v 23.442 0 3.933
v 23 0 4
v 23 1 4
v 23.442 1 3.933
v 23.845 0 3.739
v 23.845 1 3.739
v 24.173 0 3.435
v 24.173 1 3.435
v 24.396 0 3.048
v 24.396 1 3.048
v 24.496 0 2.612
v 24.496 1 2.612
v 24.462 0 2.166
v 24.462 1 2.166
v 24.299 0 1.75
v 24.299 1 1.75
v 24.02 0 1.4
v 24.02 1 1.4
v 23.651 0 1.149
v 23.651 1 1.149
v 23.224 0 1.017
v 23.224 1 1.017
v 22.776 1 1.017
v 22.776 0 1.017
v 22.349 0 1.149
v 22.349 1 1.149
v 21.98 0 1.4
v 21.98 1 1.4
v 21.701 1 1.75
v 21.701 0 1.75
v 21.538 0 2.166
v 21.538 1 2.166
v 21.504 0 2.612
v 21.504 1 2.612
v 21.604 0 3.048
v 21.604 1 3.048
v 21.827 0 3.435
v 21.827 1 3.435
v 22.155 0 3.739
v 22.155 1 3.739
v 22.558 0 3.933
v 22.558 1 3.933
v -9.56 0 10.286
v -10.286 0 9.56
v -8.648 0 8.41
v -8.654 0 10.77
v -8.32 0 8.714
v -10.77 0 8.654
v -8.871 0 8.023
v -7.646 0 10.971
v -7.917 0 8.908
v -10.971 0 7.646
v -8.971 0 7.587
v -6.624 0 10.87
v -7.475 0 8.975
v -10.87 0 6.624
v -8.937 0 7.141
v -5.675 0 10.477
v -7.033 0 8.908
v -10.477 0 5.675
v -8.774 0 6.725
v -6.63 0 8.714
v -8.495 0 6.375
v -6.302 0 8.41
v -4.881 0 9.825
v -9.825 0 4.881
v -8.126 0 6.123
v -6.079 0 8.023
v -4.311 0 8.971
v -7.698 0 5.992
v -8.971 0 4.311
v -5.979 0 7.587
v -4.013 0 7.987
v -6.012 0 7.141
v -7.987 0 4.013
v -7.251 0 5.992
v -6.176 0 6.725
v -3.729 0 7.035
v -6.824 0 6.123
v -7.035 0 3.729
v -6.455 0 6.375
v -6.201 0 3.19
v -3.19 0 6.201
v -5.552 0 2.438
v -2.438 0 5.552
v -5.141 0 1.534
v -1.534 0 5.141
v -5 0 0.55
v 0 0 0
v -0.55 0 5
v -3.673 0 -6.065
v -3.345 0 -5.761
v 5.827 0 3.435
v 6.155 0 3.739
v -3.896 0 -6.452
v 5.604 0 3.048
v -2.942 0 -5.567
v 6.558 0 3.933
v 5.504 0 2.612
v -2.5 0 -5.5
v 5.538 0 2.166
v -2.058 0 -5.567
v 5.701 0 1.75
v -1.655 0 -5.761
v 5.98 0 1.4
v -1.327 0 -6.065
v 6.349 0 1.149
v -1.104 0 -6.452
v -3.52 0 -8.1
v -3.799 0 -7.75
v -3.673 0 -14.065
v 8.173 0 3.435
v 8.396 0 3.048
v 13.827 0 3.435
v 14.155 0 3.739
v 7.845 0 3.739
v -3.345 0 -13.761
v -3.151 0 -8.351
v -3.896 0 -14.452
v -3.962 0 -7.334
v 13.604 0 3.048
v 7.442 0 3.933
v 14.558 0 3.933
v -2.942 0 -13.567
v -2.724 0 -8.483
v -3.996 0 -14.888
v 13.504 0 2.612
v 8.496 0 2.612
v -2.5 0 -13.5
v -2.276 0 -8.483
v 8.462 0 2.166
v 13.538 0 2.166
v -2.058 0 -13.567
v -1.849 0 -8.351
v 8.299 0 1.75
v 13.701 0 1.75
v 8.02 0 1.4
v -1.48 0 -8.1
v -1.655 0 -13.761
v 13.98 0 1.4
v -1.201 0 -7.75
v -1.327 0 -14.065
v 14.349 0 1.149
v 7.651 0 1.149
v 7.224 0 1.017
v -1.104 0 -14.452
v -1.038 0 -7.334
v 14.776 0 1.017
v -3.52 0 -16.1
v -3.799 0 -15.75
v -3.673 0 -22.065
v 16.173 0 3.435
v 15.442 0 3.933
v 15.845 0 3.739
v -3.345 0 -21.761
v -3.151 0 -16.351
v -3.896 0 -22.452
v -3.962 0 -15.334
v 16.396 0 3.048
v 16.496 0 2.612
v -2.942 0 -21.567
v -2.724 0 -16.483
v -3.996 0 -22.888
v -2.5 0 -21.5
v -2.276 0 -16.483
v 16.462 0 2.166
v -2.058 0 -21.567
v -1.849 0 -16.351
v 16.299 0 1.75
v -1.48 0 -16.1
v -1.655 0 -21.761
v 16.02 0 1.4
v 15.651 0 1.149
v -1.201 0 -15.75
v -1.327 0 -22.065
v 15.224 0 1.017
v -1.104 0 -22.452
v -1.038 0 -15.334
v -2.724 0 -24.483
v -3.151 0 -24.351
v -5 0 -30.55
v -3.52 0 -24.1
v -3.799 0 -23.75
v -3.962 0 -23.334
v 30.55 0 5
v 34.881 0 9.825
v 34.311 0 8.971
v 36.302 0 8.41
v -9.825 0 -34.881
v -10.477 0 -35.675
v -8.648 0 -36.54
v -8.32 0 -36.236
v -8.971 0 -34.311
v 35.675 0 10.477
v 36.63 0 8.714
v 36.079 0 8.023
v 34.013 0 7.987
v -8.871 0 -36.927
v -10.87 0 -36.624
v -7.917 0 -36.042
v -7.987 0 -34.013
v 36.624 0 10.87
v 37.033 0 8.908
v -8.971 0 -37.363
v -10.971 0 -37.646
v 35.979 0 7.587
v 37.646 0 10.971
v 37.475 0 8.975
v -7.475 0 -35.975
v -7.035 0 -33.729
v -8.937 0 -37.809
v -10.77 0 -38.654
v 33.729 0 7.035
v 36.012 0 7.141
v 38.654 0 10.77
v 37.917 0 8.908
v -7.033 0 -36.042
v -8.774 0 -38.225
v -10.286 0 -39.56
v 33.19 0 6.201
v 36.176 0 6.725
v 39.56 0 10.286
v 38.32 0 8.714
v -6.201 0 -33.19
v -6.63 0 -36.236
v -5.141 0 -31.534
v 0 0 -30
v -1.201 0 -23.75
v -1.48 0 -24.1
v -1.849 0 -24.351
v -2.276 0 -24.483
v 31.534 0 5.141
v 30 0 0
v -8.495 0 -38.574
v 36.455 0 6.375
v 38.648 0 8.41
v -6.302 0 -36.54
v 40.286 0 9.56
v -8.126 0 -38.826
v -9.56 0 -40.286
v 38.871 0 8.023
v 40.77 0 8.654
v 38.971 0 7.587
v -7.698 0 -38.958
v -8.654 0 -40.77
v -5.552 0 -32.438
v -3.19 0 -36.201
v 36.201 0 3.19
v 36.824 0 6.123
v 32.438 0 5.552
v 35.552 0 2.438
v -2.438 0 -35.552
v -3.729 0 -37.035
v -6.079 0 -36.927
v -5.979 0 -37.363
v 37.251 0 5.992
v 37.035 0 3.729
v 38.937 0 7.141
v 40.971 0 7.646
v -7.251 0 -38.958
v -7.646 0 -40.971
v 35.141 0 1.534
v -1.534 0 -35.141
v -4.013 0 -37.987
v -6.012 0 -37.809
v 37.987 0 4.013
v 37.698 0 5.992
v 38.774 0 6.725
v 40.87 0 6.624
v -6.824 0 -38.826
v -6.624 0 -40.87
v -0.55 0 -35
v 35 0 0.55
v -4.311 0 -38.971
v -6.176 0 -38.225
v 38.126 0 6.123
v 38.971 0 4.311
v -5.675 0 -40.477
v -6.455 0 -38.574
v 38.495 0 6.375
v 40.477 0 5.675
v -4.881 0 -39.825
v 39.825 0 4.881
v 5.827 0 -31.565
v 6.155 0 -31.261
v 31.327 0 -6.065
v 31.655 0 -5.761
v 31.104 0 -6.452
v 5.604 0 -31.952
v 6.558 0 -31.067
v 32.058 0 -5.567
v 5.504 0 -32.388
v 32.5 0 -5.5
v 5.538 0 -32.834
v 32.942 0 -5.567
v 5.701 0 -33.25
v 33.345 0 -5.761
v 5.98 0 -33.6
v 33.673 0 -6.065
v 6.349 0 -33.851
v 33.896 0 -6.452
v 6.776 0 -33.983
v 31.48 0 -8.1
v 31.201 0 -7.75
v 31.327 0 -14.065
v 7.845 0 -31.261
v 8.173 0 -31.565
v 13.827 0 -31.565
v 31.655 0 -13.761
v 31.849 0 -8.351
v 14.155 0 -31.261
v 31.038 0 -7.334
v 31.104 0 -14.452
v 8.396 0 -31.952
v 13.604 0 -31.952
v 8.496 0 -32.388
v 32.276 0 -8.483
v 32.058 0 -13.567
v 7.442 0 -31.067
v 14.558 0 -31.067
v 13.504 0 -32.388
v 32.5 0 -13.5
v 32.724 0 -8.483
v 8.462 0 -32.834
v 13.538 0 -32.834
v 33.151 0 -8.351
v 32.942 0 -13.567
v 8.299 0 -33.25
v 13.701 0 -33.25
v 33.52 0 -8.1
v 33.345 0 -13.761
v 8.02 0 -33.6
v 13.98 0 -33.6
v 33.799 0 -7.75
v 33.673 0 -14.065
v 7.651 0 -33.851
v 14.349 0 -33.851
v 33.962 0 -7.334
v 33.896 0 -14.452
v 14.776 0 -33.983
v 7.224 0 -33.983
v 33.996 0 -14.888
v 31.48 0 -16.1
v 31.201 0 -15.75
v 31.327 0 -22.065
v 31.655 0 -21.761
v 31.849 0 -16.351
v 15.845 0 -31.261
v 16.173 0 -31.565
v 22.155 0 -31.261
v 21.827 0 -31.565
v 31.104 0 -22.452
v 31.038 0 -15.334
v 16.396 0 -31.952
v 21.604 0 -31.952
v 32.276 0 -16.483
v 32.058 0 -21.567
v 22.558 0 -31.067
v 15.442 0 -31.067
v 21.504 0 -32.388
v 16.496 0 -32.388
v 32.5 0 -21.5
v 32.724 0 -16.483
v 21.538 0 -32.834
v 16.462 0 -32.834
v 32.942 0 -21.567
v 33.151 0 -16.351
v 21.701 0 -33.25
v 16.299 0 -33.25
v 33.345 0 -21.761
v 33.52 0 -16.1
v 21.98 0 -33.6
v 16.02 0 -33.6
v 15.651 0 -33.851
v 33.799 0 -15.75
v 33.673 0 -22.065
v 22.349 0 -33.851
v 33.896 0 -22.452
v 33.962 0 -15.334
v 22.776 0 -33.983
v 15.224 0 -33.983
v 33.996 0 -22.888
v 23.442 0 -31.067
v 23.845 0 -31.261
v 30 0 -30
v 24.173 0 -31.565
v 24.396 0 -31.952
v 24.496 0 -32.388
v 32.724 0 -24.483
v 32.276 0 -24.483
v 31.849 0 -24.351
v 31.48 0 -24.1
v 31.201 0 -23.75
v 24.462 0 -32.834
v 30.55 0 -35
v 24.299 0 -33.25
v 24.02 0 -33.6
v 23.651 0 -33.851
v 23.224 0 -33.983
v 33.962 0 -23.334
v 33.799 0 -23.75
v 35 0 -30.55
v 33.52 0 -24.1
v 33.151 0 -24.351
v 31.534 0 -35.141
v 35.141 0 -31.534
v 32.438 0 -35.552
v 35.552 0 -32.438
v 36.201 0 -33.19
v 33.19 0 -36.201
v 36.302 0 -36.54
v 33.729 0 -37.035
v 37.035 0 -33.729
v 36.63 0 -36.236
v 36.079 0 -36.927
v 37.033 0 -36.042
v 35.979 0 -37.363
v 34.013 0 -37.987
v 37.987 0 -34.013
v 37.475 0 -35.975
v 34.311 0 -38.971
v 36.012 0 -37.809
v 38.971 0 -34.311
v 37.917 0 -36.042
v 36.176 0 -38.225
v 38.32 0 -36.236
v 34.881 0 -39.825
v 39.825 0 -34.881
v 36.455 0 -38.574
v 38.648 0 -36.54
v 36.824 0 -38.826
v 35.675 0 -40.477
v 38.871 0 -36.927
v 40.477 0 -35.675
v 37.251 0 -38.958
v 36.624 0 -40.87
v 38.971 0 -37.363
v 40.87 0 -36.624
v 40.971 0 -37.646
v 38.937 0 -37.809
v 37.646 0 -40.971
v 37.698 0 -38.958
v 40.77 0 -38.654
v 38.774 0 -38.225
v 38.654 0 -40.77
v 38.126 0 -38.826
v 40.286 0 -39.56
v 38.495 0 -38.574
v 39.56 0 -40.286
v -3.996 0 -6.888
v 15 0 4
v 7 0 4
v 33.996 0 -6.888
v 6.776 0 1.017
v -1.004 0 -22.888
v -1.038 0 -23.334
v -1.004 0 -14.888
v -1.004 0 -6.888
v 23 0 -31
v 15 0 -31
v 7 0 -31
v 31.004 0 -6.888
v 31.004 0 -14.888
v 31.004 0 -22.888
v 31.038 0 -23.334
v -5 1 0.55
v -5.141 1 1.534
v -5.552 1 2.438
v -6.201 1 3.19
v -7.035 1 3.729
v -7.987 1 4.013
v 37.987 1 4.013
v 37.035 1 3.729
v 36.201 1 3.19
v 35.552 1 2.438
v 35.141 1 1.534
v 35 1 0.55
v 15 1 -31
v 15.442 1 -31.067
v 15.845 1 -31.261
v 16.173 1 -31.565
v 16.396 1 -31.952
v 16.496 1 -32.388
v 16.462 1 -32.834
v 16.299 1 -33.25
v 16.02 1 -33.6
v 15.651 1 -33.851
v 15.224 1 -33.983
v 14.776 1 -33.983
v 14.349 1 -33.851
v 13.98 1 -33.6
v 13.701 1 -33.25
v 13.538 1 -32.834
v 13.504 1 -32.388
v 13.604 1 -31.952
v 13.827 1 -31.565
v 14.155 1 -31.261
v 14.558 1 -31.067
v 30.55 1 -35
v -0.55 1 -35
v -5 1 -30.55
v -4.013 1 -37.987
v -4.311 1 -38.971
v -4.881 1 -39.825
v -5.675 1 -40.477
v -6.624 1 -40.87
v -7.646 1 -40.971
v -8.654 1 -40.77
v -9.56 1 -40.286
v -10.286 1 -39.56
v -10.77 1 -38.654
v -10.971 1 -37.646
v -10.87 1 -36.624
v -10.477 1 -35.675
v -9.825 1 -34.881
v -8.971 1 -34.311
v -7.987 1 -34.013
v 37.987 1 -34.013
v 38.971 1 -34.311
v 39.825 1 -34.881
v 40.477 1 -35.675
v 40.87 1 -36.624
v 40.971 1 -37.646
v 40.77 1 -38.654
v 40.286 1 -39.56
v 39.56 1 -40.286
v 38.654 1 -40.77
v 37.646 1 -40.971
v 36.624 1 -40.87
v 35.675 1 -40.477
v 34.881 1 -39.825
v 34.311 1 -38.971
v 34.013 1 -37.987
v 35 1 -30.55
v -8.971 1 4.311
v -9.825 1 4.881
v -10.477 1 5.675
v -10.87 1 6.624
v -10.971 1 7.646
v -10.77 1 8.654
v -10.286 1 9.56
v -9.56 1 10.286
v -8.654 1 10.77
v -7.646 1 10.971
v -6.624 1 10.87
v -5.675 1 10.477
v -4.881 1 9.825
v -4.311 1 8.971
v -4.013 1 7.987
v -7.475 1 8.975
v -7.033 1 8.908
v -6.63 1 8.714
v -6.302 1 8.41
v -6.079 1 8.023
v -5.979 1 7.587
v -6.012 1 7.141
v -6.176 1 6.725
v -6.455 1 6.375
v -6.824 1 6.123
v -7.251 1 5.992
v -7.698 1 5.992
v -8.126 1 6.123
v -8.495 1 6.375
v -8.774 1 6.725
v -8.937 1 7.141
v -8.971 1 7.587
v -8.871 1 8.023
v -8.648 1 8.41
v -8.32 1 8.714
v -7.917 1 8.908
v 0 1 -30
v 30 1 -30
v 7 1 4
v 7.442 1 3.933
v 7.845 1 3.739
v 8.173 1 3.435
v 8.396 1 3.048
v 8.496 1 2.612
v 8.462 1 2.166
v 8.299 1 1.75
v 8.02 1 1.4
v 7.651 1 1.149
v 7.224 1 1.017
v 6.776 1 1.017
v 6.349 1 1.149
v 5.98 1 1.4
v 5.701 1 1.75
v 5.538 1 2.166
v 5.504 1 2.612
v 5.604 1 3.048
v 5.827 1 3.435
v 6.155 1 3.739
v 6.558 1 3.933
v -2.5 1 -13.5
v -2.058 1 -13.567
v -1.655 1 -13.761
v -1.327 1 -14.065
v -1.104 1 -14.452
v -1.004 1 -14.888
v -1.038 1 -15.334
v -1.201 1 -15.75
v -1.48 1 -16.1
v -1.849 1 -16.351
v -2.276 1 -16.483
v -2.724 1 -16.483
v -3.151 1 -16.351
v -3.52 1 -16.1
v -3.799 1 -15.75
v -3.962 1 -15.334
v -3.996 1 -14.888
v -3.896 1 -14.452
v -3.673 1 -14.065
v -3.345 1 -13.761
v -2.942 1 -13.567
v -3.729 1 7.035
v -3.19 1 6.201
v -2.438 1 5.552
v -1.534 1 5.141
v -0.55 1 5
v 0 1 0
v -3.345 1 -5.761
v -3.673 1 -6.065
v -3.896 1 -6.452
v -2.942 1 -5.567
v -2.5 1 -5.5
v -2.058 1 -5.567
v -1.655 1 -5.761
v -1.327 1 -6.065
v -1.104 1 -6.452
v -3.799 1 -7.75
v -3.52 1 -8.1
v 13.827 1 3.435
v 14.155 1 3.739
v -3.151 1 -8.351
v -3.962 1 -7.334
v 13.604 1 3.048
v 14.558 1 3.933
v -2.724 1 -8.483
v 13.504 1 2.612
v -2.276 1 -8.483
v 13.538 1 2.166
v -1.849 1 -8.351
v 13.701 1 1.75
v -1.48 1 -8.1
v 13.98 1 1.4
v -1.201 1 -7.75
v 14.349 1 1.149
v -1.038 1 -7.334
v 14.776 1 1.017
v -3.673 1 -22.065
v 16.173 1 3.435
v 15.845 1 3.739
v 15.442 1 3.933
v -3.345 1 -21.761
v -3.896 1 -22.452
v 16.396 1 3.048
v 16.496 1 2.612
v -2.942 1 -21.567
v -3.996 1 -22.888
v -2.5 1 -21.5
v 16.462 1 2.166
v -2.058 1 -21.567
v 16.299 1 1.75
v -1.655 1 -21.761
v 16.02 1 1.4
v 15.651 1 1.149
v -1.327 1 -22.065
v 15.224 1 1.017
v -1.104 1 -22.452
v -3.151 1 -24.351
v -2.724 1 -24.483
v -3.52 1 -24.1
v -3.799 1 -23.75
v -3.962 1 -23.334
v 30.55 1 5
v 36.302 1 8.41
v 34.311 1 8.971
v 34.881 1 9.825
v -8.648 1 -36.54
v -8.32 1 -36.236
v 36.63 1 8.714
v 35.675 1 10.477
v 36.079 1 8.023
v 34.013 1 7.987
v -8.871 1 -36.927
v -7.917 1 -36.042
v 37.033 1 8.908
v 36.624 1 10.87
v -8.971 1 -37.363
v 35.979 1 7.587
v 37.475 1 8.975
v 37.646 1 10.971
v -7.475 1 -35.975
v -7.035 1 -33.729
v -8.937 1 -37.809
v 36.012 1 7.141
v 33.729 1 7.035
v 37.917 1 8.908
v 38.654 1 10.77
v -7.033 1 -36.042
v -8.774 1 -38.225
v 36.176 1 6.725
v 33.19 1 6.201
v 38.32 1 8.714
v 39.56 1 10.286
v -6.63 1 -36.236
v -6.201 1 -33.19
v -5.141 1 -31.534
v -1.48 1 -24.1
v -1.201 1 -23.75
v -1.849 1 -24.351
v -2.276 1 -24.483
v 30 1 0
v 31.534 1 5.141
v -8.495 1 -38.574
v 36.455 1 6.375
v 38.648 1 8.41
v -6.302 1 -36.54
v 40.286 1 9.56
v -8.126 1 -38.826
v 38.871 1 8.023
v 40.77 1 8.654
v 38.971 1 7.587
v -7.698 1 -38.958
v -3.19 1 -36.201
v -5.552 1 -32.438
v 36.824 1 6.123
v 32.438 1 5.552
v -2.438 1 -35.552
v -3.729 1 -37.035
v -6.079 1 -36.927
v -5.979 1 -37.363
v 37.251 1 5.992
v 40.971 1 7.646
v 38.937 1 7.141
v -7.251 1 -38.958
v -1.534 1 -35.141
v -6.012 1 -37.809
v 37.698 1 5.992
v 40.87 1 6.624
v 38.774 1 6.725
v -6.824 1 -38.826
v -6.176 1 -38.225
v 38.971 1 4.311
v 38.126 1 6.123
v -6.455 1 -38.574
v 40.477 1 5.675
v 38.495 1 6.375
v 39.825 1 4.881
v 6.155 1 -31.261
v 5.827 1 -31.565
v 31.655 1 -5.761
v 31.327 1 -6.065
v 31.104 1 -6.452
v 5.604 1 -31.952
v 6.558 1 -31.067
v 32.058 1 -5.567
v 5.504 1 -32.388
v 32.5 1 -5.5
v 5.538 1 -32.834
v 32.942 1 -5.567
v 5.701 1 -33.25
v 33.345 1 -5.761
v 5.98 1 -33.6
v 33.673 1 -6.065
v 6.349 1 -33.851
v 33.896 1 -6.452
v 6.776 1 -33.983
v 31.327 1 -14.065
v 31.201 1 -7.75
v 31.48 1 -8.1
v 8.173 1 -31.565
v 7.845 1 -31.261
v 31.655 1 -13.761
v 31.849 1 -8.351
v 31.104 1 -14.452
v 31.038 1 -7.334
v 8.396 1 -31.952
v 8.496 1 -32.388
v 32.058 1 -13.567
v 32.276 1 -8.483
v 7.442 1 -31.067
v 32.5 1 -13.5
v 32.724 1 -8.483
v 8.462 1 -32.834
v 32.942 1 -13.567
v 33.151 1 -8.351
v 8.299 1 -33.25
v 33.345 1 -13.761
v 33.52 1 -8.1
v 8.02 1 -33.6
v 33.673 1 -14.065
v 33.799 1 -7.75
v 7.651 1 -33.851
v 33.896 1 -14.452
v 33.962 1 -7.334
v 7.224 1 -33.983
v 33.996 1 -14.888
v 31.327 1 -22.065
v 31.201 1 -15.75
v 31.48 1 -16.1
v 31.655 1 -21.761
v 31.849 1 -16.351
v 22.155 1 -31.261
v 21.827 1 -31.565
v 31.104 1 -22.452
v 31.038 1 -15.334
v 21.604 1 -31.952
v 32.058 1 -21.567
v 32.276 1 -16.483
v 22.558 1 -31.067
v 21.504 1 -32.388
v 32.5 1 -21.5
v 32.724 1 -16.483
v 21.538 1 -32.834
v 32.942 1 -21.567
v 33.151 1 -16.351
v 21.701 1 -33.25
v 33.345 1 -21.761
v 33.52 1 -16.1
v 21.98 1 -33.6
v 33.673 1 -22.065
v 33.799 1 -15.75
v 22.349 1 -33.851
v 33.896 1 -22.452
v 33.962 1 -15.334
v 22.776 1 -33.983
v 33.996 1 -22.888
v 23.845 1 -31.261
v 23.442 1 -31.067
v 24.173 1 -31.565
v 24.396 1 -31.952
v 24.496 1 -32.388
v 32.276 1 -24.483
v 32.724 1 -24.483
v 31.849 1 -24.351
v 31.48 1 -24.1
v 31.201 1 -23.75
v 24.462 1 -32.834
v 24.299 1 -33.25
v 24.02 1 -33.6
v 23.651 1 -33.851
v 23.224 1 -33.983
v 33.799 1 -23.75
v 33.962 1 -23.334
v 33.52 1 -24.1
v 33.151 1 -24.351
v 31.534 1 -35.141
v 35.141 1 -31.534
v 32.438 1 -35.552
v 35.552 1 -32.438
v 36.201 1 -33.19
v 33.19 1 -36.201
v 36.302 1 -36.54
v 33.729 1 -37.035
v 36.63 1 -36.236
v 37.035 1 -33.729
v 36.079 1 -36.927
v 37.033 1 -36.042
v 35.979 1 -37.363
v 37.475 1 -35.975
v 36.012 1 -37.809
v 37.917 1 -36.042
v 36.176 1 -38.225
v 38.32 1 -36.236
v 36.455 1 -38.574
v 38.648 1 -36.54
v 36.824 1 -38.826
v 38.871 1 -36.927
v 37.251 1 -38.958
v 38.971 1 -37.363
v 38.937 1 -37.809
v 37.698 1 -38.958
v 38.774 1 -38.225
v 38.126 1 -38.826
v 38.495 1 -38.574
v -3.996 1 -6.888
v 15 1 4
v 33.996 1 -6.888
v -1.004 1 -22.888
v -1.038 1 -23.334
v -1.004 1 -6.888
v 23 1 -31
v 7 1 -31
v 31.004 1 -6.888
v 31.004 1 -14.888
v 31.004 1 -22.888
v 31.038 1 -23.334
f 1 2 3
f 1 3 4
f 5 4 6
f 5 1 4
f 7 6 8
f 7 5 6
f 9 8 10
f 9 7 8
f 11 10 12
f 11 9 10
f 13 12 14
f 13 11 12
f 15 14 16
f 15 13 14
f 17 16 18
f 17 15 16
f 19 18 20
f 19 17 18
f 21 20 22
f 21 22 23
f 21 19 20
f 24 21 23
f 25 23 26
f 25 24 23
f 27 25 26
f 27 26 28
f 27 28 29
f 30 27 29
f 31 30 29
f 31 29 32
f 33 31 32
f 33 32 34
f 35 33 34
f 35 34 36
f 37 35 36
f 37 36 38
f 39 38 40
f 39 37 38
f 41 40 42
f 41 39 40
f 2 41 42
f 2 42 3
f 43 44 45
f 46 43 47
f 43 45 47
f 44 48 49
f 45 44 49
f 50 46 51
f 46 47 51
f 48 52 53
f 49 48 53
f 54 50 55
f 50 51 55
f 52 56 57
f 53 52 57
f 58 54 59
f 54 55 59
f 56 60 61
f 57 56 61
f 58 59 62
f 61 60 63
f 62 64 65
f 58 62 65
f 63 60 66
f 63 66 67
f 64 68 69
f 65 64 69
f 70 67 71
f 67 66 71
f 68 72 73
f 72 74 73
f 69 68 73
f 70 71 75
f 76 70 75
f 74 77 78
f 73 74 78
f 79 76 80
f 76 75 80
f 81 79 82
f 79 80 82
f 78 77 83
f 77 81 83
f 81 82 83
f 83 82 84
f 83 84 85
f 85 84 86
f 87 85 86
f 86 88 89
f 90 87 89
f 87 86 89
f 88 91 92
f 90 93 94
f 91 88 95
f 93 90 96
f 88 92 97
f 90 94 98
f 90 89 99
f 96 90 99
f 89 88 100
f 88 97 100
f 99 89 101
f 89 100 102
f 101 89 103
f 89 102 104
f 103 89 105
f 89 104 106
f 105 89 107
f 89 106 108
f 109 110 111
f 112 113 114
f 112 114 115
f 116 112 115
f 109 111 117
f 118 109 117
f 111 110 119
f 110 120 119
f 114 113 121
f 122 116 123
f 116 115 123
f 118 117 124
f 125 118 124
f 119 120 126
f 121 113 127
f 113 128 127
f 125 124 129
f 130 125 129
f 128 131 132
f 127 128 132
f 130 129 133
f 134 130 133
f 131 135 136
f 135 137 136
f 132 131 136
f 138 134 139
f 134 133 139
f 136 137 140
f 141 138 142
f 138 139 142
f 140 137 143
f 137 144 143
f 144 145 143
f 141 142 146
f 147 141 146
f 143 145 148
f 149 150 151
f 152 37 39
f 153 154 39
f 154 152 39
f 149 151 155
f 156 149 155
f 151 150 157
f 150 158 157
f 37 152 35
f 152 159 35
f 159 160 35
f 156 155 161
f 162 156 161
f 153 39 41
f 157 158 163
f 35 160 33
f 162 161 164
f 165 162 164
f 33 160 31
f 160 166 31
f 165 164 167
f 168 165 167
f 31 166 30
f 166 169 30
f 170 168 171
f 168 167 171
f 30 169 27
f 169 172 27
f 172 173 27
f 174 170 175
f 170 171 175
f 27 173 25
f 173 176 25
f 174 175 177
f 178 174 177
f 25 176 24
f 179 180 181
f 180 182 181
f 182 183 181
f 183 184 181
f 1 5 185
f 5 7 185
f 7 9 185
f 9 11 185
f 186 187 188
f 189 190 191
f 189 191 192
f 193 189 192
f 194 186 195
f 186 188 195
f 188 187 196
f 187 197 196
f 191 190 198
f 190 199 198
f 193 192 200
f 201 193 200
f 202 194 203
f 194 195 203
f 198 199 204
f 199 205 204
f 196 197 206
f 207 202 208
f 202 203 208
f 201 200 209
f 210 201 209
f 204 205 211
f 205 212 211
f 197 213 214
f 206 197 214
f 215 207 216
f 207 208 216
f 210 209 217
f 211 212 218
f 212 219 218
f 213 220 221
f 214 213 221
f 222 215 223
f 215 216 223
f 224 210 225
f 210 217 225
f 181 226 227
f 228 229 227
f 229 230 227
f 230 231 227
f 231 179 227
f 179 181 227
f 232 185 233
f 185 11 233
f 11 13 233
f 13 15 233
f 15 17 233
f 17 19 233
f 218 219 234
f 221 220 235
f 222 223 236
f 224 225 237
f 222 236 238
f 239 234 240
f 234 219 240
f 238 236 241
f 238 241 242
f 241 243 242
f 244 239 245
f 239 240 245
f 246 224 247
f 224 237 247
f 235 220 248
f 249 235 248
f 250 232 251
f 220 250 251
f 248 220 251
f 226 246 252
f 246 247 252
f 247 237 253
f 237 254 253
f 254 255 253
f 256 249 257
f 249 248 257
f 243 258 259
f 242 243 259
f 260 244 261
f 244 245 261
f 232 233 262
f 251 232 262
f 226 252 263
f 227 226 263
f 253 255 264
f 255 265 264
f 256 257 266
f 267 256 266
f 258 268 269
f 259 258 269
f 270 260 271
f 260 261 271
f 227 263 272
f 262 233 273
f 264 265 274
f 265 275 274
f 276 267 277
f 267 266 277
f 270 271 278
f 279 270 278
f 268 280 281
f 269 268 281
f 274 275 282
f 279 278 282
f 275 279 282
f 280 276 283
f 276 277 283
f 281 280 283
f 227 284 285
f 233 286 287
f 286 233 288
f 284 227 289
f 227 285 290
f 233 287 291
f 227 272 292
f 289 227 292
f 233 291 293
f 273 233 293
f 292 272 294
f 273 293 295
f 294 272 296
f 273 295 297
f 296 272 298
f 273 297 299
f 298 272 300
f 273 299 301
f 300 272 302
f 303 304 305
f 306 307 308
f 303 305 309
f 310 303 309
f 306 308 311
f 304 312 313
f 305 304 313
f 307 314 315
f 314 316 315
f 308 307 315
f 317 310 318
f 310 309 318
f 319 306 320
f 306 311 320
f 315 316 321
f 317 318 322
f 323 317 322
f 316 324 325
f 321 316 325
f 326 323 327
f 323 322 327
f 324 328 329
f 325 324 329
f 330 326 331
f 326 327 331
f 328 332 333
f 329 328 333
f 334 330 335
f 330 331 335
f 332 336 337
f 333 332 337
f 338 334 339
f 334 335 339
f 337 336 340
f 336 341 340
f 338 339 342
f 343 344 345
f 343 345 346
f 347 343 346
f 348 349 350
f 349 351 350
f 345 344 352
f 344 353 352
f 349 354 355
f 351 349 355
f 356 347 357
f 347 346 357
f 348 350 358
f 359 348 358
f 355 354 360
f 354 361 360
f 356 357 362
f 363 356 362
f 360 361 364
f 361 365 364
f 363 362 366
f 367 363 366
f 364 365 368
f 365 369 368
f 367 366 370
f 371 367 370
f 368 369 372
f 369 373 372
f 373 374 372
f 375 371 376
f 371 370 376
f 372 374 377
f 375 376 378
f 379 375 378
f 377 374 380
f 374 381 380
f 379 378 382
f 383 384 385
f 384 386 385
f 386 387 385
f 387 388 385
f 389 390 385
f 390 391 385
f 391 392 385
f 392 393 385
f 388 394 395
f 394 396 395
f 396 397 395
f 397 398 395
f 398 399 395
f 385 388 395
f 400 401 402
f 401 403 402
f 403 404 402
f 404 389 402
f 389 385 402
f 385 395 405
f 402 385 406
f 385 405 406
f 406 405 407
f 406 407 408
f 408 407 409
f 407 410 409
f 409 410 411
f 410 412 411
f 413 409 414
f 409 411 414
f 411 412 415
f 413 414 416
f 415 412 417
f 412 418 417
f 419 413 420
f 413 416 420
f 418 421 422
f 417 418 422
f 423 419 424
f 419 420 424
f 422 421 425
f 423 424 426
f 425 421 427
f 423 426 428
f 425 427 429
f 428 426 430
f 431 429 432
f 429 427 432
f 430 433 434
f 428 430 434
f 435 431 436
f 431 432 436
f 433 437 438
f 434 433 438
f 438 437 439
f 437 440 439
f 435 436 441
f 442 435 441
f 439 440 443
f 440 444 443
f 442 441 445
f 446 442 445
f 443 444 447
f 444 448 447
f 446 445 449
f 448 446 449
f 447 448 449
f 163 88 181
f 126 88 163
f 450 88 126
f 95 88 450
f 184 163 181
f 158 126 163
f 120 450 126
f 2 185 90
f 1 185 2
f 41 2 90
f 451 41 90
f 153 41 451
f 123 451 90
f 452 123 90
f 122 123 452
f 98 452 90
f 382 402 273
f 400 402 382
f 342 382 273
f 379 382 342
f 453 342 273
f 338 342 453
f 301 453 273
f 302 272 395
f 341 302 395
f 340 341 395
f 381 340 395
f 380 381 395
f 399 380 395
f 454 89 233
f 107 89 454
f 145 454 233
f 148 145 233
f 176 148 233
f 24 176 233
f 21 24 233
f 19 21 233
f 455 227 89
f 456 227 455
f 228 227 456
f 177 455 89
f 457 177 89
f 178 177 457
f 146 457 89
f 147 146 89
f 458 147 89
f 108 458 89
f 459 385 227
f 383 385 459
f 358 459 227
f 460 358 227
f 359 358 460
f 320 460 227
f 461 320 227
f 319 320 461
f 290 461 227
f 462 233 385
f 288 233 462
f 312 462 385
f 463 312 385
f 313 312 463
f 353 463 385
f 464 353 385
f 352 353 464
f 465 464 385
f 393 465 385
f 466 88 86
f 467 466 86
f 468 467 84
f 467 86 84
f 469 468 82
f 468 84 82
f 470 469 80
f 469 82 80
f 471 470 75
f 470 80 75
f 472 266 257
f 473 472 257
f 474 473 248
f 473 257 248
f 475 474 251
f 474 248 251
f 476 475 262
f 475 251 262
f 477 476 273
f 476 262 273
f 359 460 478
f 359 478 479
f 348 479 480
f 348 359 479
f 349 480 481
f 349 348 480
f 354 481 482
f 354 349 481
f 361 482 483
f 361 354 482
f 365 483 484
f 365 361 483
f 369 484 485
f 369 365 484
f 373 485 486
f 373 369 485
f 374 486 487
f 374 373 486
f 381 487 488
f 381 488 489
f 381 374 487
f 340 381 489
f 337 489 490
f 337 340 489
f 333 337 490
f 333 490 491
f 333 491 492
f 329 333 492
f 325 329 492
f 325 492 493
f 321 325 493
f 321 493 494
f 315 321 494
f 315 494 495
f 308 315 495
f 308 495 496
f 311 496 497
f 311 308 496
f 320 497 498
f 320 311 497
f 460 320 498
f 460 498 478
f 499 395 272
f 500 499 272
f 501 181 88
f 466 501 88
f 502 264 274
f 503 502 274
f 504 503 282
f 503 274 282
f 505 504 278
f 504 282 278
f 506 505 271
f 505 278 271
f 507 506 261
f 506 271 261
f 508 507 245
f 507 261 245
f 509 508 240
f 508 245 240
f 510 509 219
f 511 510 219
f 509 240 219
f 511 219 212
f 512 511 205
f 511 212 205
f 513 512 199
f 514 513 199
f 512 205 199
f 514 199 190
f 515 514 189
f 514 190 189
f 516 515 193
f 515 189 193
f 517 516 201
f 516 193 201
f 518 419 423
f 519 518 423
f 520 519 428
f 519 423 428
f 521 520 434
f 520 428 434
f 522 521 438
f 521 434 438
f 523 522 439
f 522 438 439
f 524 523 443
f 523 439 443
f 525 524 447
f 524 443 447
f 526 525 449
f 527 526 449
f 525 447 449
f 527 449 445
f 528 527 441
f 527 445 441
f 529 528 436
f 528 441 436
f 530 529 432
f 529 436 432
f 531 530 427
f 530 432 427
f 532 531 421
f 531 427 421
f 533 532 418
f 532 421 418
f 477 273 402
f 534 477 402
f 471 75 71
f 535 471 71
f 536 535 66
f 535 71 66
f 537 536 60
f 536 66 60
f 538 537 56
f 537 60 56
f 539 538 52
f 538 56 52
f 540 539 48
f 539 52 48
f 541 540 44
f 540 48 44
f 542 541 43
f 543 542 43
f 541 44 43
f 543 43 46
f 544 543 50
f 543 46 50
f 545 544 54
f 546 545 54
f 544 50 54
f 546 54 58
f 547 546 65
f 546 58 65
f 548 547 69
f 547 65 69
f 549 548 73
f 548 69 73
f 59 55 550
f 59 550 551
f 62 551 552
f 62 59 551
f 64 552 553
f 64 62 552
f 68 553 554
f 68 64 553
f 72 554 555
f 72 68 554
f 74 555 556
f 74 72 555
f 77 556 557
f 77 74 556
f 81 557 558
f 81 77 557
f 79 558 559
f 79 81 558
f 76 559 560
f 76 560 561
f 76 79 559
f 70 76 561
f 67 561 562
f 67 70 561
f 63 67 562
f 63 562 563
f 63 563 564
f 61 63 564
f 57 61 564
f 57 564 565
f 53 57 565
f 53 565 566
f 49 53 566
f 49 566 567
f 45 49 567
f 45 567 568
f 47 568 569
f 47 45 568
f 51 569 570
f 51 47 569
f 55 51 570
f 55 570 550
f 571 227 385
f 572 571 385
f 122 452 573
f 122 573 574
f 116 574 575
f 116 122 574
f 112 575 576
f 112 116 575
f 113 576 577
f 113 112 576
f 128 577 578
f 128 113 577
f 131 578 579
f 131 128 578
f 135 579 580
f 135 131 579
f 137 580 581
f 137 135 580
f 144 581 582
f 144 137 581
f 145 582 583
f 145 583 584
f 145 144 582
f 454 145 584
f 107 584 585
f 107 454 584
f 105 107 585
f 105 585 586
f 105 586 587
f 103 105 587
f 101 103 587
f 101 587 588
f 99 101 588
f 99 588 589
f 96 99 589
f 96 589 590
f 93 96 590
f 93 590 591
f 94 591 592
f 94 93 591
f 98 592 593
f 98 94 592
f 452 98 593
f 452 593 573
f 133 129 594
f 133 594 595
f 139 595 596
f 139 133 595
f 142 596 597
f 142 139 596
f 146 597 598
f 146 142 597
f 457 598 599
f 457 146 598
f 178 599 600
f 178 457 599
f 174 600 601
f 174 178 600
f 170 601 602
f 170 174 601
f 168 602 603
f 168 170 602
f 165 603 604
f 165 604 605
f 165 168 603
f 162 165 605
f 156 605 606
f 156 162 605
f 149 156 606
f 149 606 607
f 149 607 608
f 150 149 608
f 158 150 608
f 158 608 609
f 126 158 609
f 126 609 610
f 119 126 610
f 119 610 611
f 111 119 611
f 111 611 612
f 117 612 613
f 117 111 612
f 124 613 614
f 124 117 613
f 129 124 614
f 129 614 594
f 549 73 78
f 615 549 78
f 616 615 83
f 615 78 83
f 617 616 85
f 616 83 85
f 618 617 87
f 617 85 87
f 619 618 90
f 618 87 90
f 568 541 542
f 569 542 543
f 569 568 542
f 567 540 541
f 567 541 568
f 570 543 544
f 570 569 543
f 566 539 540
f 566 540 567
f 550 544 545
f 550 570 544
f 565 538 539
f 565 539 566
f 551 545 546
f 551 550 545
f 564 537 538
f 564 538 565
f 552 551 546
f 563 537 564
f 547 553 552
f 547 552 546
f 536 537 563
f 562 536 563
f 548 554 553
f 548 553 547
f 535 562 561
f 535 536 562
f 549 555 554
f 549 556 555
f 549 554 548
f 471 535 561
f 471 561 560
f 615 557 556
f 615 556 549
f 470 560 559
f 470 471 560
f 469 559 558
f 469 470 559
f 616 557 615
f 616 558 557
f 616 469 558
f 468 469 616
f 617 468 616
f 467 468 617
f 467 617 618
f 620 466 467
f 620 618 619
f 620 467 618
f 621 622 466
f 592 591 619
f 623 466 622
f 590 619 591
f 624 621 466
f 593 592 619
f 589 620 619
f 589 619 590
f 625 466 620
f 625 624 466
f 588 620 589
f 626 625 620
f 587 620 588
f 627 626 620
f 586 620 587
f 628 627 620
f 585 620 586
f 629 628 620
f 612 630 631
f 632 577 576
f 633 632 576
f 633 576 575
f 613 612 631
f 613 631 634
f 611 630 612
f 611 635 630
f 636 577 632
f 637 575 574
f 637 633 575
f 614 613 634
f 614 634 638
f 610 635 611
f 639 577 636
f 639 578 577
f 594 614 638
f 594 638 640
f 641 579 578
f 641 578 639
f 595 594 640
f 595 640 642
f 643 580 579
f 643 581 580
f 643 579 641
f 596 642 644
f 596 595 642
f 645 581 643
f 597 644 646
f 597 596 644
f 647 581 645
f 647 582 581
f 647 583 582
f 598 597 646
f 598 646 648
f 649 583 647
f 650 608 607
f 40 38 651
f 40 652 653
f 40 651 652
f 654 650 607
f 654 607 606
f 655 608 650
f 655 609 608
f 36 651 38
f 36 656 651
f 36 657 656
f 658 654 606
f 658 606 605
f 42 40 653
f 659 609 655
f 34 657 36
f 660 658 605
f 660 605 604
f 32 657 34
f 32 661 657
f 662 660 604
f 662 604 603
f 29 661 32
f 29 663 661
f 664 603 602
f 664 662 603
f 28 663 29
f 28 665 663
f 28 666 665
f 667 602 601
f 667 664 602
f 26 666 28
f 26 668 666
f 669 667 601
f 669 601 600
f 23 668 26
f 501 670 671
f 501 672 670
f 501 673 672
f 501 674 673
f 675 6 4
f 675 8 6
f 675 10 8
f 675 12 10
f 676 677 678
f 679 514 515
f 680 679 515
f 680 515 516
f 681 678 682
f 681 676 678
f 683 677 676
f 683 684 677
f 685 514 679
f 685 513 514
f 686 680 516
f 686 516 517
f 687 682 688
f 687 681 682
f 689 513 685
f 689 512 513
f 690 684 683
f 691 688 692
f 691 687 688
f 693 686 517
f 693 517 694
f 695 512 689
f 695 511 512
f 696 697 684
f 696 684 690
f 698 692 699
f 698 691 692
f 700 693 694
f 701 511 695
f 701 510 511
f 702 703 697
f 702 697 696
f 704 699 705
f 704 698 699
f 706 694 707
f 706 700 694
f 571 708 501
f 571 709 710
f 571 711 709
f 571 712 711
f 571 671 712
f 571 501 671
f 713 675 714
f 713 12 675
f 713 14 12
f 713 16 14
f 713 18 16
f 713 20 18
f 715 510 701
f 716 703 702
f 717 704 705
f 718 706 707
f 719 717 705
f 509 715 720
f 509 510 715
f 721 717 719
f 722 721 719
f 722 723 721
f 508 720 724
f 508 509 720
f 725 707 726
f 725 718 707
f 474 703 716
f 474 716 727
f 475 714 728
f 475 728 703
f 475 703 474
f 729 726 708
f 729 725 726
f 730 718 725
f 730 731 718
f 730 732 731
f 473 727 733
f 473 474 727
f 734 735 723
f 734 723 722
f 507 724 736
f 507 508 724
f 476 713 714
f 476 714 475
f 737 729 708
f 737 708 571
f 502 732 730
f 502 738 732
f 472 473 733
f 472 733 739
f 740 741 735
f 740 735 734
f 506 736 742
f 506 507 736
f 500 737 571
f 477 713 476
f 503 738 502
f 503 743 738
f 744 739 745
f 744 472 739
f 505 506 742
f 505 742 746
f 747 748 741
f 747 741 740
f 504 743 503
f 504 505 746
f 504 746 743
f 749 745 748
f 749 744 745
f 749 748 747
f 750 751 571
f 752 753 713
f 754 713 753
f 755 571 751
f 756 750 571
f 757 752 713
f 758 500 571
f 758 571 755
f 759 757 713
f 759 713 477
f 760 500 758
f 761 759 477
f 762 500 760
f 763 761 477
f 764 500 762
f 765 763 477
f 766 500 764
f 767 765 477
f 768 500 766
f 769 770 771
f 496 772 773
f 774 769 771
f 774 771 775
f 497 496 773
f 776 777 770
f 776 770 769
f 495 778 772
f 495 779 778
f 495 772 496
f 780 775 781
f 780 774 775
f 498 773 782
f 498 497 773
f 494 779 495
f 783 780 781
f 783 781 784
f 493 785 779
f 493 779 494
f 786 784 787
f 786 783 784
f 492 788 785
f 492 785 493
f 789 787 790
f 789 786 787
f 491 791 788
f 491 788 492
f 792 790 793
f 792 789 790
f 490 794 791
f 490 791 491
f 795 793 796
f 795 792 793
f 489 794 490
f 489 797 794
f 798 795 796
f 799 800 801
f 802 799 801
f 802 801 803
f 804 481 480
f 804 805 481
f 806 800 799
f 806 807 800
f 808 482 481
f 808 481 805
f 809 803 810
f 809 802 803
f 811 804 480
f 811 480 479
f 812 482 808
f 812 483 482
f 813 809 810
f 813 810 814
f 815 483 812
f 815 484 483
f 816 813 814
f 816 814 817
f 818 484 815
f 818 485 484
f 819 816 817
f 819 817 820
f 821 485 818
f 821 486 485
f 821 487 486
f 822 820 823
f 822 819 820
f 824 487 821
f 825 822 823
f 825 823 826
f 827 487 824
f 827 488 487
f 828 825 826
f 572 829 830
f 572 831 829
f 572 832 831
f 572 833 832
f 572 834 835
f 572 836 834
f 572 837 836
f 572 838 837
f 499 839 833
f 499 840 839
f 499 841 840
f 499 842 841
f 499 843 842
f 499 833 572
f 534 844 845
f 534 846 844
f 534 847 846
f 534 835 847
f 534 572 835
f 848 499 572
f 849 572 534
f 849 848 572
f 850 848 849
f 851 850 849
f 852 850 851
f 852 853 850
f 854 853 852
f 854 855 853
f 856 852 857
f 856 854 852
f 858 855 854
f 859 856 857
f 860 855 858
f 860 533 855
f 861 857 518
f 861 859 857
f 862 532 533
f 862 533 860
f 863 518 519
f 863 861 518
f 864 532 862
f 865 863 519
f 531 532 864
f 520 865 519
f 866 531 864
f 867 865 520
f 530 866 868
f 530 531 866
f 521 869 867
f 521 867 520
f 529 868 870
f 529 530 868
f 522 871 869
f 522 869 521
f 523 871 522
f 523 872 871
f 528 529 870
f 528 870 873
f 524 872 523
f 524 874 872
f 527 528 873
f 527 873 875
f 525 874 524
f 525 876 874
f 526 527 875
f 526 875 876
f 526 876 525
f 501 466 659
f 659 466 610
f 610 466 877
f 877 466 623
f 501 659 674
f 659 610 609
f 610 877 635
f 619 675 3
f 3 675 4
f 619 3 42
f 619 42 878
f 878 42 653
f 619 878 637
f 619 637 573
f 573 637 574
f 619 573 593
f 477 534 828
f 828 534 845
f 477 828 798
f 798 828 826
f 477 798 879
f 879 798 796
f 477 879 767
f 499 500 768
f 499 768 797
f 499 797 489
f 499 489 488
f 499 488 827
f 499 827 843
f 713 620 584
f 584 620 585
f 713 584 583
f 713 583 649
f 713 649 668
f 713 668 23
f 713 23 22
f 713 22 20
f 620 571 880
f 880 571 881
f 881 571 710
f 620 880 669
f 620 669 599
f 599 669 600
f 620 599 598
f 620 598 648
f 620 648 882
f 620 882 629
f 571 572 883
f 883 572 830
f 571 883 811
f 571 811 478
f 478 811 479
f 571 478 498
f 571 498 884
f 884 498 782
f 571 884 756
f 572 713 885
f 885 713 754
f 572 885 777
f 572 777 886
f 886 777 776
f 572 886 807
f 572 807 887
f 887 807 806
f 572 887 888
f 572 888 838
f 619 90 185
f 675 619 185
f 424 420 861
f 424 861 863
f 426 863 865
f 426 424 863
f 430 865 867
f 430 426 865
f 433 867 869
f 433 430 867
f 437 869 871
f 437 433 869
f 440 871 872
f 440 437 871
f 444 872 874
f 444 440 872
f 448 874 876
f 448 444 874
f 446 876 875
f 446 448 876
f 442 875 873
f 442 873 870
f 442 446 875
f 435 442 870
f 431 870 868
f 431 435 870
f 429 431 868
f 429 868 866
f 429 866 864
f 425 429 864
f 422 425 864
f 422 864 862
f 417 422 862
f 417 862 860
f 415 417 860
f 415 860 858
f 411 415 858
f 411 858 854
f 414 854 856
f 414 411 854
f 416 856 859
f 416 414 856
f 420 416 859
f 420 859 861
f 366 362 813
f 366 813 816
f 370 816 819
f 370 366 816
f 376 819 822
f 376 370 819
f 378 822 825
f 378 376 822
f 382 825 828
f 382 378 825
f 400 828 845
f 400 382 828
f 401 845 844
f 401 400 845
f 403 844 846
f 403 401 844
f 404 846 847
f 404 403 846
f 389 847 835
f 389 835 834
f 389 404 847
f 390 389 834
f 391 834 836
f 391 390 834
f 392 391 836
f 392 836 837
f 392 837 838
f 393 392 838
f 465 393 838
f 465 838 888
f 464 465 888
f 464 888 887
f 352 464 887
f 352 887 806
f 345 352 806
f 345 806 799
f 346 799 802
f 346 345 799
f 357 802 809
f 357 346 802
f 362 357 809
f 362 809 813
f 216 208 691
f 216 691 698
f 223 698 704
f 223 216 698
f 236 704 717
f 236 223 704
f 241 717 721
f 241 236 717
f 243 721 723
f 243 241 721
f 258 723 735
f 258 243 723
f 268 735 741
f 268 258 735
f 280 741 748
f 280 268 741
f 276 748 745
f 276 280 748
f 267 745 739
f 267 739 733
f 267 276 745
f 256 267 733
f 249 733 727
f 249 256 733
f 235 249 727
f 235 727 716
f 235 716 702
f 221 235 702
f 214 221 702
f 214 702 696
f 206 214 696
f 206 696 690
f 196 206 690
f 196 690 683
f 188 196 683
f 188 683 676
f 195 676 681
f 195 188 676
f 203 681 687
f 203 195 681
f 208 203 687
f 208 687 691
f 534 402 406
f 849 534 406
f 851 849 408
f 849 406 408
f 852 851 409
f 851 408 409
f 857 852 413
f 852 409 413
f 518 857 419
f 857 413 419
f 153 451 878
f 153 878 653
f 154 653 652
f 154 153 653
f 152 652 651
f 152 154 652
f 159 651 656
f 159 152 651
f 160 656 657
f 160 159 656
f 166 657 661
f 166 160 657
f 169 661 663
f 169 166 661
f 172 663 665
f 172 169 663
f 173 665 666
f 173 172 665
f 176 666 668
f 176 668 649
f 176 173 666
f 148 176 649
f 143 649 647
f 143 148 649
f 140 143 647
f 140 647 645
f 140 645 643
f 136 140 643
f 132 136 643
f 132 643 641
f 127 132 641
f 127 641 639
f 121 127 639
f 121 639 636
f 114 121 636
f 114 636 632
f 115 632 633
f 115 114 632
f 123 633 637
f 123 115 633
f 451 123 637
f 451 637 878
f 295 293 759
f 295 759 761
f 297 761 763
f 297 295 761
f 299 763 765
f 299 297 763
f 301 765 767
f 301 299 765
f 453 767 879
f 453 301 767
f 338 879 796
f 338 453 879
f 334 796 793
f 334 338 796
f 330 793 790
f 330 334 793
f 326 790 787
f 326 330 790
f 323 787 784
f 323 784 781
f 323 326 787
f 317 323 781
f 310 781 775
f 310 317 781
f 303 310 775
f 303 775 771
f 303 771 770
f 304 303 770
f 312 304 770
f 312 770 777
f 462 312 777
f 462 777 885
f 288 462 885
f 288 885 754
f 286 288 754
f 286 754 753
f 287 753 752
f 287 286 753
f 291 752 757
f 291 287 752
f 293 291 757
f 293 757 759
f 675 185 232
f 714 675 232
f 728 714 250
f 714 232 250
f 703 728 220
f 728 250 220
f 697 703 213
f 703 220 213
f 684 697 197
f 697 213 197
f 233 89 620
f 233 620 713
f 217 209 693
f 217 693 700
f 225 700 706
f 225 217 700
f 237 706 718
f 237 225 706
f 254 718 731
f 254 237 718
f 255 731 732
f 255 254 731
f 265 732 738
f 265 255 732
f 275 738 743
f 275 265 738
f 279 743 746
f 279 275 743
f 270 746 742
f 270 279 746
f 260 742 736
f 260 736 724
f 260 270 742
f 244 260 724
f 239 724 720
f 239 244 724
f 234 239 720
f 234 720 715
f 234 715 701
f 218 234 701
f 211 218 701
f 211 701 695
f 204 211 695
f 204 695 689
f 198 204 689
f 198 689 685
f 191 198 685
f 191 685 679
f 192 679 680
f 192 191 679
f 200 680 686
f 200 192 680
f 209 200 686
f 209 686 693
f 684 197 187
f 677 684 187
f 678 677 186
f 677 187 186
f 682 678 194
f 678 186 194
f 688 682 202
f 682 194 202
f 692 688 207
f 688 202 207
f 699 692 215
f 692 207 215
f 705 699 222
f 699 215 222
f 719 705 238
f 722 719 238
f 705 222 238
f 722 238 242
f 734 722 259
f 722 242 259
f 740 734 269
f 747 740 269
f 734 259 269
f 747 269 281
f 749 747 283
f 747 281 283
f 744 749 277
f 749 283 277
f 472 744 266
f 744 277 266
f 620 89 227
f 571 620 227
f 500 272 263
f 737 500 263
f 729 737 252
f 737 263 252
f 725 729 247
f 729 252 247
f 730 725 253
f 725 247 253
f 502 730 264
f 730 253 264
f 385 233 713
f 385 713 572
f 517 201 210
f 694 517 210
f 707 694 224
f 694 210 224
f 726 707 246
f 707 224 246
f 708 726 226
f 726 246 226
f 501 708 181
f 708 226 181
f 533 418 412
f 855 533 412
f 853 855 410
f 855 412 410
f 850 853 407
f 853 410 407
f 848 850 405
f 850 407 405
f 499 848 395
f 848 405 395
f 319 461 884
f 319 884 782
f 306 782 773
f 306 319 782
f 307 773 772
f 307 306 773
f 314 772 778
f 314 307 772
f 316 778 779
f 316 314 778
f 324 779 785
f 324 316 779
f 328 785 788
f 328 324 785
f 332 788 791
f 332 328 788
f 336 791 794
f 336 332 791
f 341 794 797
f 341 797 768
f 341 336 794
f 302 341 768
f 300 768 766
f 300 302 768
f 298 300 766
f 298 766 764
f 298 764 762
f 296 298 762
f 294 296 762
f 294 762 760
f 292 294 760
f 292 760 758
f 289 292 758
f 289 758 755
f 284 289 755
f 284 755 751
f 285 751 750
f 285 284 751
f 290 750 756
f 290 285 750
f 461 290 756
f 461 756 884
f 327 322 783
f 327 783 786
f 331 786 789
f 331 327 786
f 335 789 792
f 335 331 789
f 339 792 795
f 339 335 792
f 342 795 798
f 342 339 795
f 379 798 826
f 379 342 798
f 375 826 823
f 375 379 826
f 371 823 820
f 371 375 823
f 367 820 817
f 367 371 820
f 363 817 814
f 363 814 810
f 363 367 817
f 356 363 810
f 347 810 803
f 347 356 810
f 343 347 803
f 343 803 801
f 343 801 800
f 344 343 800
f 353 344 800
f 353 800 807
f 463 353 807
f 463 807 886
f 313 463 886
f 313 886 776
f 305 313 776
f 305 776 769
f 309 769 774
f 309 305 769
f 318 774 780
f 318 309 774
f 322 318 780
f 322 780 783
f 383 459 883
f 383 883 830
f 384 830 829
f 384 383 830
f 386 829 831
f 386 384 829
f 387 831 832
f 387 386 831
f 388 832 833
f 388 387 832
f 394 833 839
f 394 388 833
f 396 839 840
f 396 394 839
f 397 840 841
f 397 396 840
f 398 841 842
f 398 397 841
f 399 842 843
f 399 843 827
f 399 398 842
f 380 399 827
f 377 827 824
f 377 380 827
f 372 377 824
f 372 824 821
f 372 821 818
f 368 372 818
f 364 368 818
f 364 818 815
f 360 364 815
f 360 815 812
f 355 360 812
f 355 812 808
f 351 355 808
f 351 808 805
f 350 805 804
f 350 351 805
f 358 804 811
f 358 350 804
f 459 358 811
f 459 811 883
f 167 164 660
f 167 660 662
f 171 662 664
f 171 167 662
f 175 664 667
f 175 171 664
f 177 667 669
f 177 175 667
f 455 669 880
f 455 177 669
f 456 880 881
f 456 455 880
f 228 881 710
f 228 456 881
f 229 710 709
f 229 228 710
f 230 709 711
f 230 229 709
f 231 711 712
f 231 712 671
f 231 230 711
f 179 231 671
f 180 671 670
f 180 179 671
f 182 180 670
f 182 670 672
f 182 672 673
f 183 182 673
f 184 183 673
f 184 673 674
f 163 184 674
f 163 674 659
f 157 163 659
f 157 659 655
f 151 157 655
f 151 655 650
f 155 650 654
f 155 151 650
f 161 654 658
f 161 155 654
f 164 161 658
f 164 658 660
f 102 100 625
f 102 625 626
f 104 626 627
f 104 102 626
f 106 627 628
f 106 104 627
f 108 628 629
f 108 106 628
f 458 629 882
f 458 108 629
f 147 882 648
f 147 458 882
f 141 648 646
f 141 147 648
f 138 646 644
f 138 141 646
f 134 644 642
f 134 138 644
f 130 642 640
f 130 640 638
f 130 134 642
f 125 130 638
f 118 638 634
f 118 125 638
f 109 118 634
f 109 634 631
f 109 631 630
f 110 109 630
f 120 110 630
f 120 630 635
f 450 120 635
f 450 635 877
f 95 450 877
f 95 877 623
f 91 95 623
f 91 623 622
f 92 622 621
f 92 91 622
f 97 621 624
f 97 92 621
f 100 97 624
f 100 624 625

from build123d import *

# Parameters (mm, degrees)
CROQUIS1_R              = 1.5
CROQUIS1_W              = 30
CROQUIS1_H              = 30
SALIENTE_EXTRUIR1_DEPTH = 1


with BuildPart() as part:
    # Croquis1 → Saliente-Extruir1 (new body)
    with BuildSketch(Plane(origin=(0, 0, 0), x_dir=(1, 0, 0), z_dir=(0, 1, 0))):
        with BuildLine():
            Line((-5, 30.550343704), (-5, -0.550343704))
            ThreePointArc((-5, -0.550343704), (-5.850097081, -2.836828892), (-7.987436867, -4.012608719))
            ThreePointArc((-7.987436867, -4.012608719), (-9.949747468, -9.949747468), (-4.012608719, -7.987436867))
            ThreePointArc((-4.012608719, -7.987436867), (-2.836828892, -5.850097081), (-0.550343704, -5))
            Line((-0.550343704, -5), (30.550343704, -5))
            ThreePointArc((30.550343704, -5), (32.836828892, -5.850097081), (34.012608719, -7.987436867))
            ThreePointArc((34.012608719, -7.987436867), (39.949747468, -9.949747468), (37.987436867, -4.012608719))
            ThreePointArc((37.987436867, -4.012608719), (35.850097081, -2.836828892), (35, -0.550343704))
            Line((35, -0.550343704), (35, 30.550343704))
            ThreePointArc((35, 30.550343704), (35.850097081, 32.836828892), (37.987436867, 34.012608719))
            ThreePointArc((37.987436867, 34.012608719), (39.949747468, 39.949747468), (34.012608719, 37.987436867))
            ThreePointArc((34.012608719, 37.987436867), (32.836828892, 35.850097081), (30.550343704, 35))
            Line((30.550343704, 35), (-0.550343704, 35))
            ThreePointArc((-0.550343704, 35), (-2.836828892, 35.850097081), (-4.012608719, 37.987436867))
            ThreePointArc((-4.012608719, 37.987436867), (-9.949747468, 39.949747468), (-7.987436867, 34.012608719))
            ThreePointArc((-7.987436867, 34.012608719), (-5.850097081, 32.836828892), (-5, 30.550343704))
        make_face()
        with Locations(Location((7, -2.5, 0), (0, 0, 270))):
            Circle(CROQUIS1_R, mode=Mode.SUBTRACT)
        with Locations(Location((15, -2.5, 0), (0, 0, 270))):
            Circle(CROQUIS1_R, mode=Mode.SUBTRACT)
        with Locations(Location((-2.5, 7, 0), (0, 0, 270))):
            Circle(CROQUIS1_R, mode=Mode.SUBTRACT)
        with Locations((15, 15)):
            Rectangle(CROQUIS1_W, CROQUIS1_H, mode=Mode.SUBTRACT)
        with Locations(Location((23, -2.5, 0), (0, 0, 270))):
            Circle(CROQUIS1_R, mode=Mode.SUBTRACT)
        with Locations(Location((32.5, 7, 0), (0, 0, 270))):
            Circle(CROQUIS1_R, mode=Mode.SUBTRACT)
        with Locations(Location((32.5, 15, 0), (0, 0, 270))):
            Circle(CROQUIS1_R, mode=Mode.SUBTRACT)
        with Locations(Location((-2.5, 15, 0), (0, 0, 270))):
            Circle(CROQUIS1_R, mode=Mode.SUBTRACT)
        with Locations(Location((-2.5, 23, 0), (0, 0, 270))):
            Circle(CROQUIS1_R, mode=Mode.SUBTRACT)
        with Locations(Location((-7.474873734, 37.474873734, 0), (0, 0, 270))):
            Circle(CROQUIS1_R, mode=Mode.SUBTRACT)
        with Locations(Location((7, 32.5, 0), (0, 0, 270))):
            Circle(CROQUIS1_R, mode=Mode.SUBTRACT)
        with Locations(Location((32.5, 23, 0), (0, 0, 270))):
            Circle(CROQUIS1_R, mode=Mode.SUBTRACT)
        with Locations(Location((15, 32.5, 0), (0, 0, 270))):
            Circle(CROQUIS1_R, mode=Mode.SUBTRACT)
        with Locations(Location((23, 32.5, 0), (0, 0, 270))):
            Circle(CROQUIS1_R, mode=Mode.SUBTRACT)
        with Locations(Location((-7.474873734, -7.474873734, 0), (0, 0, 270))):
            Circle(CROQUIS1_R, mode=Mode.SUBTRACT)
        with Locations(Location((37.474873734, -7.474873734, 0), (0, 0, 270))):
            Circle(CROQUIS1_R, mode=Mode.SUBTRACT)
        with Locations(Location((37.474873734, 37.474873734, 0), (0, 0, 270))):
            Circle(CROQUIS1_R, mode=Mode.SUBTRACT)
    extrude(amount=SALIENTE_EXTRUIR1_DEPTH)


solid = part.part
